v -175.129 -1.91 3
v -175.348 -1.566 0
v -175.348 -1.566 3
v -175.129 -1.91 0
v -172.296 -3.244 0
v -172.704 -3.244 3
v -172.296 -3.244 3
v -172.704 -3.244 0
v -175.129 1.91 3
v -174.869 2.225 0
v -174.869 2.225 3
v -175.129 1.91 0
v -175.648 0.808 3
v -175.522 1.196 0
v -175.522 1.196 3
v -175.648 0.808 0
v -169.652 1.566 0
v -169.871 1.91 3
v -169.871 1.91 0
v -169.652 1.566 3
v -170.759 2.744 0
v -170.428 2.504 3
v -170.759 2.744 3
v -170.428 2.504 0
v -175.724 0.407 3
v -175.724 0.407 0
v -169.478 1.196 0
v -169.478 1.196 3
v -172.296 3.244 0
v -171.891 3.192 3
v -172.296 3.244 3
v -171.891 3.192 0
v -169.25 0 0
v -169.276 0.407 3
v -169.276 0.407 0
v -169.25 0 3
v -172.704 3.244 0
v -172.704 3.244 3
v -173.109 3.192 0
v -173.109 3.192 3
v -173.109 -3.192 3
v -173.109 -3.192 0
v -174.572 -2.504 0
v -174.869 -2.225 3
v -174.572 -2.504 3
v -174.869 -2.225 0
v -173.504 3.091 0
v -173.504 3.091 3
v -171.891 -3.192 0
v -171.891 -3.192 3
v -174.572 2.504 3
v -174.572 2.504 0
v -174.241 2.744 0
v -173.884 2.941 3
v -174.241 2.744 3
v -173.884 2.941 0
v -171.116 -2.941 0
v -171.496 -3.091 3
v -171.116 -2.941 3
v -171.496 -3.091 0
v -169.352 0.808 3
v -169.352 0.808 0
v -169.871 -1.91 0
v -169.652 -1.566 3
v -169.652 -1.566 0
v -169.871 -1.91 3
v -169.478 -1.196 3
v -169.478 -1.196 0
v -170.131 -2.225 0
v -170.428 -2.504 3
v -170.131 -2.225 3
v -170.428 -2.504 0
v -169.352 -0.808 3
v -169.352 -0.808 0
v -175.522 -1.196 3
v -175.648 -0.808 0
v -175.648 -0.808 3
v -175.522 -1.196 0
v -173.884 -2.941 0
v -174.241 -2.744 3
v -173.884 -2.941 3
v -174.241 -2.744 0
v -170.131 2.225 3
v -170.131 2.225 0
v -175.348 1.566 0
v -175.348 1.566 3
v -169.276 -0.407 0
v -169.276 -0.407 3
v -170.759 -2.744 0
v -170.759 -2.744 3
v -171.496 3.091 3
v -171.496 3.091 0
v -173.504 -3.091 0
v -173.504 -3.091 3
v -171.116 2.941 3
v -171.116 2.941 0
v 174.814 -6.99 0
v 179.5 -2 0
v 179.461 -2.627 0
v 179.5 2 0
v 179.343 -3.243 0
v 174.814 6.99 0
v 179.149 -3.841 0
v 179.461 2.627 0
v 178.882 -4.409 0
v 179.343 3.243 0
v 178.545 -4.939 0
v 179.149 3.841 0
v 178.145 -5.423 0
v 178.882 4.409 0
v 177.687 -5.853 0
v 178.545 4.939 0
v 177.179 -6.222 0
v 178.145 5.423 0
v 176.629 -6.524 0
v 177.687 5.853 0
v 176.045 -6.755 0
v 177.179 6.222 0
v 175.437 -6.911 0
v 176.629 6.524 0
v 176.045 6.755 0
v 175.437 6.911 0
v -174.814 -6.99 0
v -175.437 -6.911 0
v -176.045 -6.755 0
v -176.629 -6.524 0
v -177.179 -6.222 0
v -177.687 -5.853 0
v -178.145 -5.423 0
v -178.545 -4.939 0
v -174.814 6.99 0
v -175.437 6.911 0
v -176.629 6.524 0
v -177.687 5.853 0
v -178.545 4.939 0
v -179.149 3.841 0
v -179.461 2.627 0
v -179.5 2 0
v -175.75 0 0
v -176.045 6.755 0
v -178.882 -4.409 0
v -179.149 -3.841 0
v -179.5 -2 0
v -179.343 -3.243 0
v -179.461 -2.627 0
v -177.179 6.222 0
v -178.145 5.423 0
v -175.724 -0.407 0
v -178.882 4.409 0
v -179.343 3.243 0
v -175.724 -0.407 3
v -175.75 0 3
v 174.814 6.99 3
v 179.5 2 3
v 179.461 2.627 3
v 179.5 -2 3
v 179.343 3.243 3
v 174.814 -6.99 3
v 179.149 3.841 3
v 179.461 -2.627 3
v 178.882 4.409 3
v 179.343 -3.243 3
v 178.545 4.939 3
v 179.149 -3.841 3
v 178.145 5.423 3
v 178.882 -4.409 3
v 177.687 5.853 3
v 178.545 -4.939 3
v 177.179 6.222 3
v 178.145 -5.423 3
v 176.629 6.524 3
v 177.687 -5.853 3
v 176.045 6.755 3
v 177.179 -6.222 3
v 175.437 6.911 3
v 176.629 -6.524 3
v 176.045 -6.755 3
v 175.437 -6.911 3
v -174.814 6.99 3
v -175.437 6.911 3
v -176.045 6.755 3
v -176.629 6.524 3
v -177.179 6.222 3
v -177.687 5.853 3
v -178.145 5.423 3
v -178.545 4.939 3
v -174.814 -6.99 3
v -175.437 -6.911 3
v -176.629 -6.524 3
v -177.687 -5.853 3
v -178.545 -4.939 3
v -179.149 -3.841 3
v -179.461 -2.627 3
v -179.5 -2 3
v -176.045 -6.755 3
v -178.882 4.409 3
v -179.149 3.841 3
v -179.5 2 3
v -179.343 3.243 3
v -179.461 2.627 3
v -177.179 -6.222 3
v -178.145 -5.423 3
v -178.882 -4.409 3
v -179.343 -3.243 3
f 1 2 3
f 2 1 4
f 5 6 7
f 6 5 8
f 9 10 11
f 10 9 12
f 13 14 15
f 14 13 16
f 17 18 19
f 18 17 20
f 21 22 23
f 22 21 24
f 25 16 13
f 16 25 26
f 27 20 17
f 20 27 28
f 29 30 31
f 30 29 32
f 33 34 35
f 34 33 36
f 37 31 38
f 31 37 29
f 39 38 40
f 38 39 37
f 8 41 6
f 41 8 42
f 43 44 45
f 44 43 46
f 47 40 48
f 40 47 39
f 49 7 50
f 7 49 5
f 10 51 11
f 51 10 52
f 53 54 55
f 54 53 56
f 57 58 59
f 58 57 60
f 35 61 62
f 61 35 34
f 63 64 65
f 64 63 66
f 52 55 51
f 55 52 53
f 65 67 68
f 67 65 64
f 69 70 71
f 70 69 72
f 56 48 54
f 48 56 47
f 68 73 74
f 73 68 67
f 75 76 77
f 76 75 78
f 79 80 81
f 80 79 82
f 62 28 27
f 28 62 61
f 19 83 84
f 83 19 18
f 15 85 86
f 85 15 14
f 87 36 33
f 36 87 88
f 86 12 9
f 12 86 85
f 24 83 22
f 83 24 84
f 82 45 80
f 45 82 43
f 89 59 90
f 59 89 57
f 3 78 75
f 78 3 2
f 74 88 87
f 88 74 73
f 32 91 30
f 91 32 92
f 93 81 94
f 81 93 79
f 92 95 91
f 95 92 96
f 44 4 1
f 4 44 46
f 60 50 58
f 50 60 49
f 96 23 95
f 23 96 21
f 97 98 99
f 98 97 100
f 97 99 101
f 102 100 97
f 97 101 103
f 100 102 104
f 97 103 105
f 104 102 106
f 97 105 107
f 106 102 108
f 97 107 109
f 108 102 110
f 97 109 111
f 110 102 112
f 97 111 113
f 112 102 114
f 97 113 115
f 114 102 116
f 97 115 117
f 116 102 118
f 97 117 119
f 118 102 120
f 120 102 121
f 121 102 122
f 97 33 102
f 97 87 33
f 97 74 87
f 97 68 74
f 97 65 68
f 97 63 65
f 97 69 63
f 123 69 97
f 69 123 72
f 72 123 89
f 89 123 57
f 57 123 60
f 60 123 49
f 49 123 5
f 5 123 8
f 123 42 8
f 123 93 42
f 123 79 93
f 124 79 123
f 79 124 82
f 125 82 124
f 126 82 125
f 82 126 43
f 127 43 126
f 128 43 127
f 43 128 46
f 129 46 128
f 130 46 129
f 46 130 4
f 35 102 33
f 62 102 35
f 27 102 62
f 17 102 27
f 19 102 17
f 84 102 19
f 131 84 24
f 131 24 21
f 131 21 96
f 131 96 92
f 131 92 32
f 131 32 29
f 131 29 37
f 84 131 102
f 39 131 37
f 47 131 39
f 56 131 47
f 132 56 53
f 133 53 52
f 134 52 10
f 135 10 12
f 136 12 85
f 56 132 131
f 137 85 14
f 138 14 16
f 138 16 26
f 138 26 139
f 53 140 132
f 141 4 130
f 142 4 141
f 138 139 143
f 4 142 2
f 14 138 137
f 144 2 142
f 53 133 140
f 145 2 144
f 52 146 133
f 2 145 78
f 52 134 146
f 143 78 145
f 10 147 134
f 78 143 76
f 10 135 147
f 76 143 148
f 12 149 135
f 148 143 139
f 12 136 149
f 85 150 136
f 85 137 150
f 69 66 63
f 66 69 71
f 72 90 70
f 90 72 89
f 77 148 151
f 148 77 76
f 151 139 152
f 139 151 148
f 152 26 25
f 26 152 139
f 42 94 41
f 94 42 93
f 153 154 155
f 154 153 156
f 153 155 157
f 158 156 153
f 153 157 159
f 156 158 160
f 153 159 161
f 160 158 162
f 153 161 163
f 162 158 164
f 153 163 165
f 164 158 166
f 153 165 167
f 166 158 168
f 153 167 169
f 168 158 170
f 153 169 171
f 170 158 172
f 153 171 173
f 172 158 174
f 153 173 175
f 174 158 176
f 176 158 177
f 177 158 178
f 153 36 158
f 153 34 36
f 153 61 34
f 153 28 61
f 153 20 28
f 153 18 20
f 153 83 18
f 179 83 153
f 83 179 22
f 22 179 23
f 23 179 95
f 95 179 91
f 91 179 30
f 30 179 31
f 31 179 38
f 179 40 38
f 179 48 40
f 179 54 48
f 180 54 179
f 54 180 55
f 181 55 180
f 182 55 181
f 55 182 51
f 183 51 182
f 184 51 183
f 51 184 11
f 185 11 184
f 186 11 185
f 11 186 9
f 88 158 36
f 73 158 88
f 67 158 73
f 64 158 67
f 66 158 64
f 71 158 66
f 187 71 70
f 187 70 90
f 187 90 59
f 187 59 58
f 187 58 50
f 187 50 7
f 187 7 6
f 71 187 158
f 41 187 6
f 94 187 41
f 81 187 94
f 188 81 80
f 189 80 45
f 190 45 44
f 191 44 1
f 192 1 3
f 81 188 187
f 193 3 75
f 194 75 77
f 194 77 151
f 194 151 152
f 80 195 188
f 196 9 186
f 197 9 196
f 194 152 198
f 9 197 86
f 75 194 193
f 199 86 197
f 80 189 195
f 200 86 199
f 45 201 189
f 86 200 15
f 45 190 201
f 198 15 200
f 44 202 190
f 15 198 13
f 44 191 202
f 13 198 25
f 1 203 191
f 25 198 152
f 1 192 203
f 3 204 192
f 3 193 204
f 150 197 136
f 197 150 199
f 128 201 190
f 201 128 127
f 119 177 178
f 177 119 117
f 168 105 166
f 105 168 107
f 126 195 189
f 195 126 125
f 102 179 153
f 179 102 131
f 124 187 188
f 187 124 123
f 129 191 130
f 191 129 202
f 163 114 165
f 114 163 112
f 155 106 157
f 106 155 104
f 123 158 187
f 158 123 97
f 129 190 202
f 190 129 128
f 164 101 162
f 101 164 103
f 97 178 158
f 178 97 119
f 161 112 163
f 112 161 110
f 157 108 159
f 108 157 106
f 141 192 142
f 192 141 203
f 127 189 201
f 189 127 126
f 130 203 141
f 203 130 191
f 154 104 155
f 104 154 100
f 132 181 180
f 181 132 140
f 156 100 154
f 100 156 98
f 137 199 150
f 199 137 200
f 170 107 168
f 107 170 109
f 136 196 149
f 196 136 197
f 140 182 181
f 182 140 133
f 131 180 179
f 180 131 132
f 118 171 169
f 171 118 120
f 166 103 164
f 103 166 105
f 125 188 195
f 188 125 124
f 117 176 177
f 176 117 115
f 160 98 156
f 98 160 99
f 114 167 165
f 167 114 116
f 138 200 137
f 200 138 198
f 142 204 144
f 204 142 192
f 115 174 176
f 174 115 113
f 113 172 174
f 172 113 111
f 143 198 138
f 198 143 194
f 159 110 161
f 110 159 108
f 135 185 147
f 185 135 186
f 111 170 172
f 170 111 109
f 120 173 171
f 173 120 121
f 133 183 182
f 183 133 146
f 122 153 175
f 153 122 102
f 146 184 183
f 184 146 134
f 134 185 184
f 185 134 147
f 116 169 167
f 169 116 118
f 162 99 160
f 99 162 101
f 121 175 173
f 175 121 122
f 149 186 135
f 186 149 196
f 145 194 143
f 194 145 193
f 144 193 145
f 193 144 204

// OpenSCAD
$fn = 50;


difference() {
	union() {
		hull() {
			translate(v = [-174.5000000000, 2.0000000000, 0]) {
				cylinder(h = 3, r = 5);
			}
			translate(v = [174.5000000000, 2.0000000000, 0]) {
				cylinder(h = 3, r = 5);
			}
			translate(v = [-174.5000000000, -2.0000000000, 0]) {
				cylinder(h = 3, r = 5);
			}
			translate(v = [174.5000000000, -2.0000000000, 0]) {
				cylinder(h = 3, r = 5);
			}
		}
	}
	union() {
		translate(v = [-172.5000000000, 0.0000000000, 0]) {
			cylinder(h = 3, r = 3.2500000000);
		}
		translate(v = [-172.5000000000, 0.0000000000, 0]) {
			cylinder(h = 3, r = 1.8000000000);
		}
		translate(v = [-172.5000000000, 0.0000000000, 0]) {
			cylinder(h = 3, r = 1.8000000000);
		}
		translate(v = [-172.5000000000, 0.0000000000, 0]) {
			cylinder(h = 3, r = 1.8000000000);
		}
	}
}
